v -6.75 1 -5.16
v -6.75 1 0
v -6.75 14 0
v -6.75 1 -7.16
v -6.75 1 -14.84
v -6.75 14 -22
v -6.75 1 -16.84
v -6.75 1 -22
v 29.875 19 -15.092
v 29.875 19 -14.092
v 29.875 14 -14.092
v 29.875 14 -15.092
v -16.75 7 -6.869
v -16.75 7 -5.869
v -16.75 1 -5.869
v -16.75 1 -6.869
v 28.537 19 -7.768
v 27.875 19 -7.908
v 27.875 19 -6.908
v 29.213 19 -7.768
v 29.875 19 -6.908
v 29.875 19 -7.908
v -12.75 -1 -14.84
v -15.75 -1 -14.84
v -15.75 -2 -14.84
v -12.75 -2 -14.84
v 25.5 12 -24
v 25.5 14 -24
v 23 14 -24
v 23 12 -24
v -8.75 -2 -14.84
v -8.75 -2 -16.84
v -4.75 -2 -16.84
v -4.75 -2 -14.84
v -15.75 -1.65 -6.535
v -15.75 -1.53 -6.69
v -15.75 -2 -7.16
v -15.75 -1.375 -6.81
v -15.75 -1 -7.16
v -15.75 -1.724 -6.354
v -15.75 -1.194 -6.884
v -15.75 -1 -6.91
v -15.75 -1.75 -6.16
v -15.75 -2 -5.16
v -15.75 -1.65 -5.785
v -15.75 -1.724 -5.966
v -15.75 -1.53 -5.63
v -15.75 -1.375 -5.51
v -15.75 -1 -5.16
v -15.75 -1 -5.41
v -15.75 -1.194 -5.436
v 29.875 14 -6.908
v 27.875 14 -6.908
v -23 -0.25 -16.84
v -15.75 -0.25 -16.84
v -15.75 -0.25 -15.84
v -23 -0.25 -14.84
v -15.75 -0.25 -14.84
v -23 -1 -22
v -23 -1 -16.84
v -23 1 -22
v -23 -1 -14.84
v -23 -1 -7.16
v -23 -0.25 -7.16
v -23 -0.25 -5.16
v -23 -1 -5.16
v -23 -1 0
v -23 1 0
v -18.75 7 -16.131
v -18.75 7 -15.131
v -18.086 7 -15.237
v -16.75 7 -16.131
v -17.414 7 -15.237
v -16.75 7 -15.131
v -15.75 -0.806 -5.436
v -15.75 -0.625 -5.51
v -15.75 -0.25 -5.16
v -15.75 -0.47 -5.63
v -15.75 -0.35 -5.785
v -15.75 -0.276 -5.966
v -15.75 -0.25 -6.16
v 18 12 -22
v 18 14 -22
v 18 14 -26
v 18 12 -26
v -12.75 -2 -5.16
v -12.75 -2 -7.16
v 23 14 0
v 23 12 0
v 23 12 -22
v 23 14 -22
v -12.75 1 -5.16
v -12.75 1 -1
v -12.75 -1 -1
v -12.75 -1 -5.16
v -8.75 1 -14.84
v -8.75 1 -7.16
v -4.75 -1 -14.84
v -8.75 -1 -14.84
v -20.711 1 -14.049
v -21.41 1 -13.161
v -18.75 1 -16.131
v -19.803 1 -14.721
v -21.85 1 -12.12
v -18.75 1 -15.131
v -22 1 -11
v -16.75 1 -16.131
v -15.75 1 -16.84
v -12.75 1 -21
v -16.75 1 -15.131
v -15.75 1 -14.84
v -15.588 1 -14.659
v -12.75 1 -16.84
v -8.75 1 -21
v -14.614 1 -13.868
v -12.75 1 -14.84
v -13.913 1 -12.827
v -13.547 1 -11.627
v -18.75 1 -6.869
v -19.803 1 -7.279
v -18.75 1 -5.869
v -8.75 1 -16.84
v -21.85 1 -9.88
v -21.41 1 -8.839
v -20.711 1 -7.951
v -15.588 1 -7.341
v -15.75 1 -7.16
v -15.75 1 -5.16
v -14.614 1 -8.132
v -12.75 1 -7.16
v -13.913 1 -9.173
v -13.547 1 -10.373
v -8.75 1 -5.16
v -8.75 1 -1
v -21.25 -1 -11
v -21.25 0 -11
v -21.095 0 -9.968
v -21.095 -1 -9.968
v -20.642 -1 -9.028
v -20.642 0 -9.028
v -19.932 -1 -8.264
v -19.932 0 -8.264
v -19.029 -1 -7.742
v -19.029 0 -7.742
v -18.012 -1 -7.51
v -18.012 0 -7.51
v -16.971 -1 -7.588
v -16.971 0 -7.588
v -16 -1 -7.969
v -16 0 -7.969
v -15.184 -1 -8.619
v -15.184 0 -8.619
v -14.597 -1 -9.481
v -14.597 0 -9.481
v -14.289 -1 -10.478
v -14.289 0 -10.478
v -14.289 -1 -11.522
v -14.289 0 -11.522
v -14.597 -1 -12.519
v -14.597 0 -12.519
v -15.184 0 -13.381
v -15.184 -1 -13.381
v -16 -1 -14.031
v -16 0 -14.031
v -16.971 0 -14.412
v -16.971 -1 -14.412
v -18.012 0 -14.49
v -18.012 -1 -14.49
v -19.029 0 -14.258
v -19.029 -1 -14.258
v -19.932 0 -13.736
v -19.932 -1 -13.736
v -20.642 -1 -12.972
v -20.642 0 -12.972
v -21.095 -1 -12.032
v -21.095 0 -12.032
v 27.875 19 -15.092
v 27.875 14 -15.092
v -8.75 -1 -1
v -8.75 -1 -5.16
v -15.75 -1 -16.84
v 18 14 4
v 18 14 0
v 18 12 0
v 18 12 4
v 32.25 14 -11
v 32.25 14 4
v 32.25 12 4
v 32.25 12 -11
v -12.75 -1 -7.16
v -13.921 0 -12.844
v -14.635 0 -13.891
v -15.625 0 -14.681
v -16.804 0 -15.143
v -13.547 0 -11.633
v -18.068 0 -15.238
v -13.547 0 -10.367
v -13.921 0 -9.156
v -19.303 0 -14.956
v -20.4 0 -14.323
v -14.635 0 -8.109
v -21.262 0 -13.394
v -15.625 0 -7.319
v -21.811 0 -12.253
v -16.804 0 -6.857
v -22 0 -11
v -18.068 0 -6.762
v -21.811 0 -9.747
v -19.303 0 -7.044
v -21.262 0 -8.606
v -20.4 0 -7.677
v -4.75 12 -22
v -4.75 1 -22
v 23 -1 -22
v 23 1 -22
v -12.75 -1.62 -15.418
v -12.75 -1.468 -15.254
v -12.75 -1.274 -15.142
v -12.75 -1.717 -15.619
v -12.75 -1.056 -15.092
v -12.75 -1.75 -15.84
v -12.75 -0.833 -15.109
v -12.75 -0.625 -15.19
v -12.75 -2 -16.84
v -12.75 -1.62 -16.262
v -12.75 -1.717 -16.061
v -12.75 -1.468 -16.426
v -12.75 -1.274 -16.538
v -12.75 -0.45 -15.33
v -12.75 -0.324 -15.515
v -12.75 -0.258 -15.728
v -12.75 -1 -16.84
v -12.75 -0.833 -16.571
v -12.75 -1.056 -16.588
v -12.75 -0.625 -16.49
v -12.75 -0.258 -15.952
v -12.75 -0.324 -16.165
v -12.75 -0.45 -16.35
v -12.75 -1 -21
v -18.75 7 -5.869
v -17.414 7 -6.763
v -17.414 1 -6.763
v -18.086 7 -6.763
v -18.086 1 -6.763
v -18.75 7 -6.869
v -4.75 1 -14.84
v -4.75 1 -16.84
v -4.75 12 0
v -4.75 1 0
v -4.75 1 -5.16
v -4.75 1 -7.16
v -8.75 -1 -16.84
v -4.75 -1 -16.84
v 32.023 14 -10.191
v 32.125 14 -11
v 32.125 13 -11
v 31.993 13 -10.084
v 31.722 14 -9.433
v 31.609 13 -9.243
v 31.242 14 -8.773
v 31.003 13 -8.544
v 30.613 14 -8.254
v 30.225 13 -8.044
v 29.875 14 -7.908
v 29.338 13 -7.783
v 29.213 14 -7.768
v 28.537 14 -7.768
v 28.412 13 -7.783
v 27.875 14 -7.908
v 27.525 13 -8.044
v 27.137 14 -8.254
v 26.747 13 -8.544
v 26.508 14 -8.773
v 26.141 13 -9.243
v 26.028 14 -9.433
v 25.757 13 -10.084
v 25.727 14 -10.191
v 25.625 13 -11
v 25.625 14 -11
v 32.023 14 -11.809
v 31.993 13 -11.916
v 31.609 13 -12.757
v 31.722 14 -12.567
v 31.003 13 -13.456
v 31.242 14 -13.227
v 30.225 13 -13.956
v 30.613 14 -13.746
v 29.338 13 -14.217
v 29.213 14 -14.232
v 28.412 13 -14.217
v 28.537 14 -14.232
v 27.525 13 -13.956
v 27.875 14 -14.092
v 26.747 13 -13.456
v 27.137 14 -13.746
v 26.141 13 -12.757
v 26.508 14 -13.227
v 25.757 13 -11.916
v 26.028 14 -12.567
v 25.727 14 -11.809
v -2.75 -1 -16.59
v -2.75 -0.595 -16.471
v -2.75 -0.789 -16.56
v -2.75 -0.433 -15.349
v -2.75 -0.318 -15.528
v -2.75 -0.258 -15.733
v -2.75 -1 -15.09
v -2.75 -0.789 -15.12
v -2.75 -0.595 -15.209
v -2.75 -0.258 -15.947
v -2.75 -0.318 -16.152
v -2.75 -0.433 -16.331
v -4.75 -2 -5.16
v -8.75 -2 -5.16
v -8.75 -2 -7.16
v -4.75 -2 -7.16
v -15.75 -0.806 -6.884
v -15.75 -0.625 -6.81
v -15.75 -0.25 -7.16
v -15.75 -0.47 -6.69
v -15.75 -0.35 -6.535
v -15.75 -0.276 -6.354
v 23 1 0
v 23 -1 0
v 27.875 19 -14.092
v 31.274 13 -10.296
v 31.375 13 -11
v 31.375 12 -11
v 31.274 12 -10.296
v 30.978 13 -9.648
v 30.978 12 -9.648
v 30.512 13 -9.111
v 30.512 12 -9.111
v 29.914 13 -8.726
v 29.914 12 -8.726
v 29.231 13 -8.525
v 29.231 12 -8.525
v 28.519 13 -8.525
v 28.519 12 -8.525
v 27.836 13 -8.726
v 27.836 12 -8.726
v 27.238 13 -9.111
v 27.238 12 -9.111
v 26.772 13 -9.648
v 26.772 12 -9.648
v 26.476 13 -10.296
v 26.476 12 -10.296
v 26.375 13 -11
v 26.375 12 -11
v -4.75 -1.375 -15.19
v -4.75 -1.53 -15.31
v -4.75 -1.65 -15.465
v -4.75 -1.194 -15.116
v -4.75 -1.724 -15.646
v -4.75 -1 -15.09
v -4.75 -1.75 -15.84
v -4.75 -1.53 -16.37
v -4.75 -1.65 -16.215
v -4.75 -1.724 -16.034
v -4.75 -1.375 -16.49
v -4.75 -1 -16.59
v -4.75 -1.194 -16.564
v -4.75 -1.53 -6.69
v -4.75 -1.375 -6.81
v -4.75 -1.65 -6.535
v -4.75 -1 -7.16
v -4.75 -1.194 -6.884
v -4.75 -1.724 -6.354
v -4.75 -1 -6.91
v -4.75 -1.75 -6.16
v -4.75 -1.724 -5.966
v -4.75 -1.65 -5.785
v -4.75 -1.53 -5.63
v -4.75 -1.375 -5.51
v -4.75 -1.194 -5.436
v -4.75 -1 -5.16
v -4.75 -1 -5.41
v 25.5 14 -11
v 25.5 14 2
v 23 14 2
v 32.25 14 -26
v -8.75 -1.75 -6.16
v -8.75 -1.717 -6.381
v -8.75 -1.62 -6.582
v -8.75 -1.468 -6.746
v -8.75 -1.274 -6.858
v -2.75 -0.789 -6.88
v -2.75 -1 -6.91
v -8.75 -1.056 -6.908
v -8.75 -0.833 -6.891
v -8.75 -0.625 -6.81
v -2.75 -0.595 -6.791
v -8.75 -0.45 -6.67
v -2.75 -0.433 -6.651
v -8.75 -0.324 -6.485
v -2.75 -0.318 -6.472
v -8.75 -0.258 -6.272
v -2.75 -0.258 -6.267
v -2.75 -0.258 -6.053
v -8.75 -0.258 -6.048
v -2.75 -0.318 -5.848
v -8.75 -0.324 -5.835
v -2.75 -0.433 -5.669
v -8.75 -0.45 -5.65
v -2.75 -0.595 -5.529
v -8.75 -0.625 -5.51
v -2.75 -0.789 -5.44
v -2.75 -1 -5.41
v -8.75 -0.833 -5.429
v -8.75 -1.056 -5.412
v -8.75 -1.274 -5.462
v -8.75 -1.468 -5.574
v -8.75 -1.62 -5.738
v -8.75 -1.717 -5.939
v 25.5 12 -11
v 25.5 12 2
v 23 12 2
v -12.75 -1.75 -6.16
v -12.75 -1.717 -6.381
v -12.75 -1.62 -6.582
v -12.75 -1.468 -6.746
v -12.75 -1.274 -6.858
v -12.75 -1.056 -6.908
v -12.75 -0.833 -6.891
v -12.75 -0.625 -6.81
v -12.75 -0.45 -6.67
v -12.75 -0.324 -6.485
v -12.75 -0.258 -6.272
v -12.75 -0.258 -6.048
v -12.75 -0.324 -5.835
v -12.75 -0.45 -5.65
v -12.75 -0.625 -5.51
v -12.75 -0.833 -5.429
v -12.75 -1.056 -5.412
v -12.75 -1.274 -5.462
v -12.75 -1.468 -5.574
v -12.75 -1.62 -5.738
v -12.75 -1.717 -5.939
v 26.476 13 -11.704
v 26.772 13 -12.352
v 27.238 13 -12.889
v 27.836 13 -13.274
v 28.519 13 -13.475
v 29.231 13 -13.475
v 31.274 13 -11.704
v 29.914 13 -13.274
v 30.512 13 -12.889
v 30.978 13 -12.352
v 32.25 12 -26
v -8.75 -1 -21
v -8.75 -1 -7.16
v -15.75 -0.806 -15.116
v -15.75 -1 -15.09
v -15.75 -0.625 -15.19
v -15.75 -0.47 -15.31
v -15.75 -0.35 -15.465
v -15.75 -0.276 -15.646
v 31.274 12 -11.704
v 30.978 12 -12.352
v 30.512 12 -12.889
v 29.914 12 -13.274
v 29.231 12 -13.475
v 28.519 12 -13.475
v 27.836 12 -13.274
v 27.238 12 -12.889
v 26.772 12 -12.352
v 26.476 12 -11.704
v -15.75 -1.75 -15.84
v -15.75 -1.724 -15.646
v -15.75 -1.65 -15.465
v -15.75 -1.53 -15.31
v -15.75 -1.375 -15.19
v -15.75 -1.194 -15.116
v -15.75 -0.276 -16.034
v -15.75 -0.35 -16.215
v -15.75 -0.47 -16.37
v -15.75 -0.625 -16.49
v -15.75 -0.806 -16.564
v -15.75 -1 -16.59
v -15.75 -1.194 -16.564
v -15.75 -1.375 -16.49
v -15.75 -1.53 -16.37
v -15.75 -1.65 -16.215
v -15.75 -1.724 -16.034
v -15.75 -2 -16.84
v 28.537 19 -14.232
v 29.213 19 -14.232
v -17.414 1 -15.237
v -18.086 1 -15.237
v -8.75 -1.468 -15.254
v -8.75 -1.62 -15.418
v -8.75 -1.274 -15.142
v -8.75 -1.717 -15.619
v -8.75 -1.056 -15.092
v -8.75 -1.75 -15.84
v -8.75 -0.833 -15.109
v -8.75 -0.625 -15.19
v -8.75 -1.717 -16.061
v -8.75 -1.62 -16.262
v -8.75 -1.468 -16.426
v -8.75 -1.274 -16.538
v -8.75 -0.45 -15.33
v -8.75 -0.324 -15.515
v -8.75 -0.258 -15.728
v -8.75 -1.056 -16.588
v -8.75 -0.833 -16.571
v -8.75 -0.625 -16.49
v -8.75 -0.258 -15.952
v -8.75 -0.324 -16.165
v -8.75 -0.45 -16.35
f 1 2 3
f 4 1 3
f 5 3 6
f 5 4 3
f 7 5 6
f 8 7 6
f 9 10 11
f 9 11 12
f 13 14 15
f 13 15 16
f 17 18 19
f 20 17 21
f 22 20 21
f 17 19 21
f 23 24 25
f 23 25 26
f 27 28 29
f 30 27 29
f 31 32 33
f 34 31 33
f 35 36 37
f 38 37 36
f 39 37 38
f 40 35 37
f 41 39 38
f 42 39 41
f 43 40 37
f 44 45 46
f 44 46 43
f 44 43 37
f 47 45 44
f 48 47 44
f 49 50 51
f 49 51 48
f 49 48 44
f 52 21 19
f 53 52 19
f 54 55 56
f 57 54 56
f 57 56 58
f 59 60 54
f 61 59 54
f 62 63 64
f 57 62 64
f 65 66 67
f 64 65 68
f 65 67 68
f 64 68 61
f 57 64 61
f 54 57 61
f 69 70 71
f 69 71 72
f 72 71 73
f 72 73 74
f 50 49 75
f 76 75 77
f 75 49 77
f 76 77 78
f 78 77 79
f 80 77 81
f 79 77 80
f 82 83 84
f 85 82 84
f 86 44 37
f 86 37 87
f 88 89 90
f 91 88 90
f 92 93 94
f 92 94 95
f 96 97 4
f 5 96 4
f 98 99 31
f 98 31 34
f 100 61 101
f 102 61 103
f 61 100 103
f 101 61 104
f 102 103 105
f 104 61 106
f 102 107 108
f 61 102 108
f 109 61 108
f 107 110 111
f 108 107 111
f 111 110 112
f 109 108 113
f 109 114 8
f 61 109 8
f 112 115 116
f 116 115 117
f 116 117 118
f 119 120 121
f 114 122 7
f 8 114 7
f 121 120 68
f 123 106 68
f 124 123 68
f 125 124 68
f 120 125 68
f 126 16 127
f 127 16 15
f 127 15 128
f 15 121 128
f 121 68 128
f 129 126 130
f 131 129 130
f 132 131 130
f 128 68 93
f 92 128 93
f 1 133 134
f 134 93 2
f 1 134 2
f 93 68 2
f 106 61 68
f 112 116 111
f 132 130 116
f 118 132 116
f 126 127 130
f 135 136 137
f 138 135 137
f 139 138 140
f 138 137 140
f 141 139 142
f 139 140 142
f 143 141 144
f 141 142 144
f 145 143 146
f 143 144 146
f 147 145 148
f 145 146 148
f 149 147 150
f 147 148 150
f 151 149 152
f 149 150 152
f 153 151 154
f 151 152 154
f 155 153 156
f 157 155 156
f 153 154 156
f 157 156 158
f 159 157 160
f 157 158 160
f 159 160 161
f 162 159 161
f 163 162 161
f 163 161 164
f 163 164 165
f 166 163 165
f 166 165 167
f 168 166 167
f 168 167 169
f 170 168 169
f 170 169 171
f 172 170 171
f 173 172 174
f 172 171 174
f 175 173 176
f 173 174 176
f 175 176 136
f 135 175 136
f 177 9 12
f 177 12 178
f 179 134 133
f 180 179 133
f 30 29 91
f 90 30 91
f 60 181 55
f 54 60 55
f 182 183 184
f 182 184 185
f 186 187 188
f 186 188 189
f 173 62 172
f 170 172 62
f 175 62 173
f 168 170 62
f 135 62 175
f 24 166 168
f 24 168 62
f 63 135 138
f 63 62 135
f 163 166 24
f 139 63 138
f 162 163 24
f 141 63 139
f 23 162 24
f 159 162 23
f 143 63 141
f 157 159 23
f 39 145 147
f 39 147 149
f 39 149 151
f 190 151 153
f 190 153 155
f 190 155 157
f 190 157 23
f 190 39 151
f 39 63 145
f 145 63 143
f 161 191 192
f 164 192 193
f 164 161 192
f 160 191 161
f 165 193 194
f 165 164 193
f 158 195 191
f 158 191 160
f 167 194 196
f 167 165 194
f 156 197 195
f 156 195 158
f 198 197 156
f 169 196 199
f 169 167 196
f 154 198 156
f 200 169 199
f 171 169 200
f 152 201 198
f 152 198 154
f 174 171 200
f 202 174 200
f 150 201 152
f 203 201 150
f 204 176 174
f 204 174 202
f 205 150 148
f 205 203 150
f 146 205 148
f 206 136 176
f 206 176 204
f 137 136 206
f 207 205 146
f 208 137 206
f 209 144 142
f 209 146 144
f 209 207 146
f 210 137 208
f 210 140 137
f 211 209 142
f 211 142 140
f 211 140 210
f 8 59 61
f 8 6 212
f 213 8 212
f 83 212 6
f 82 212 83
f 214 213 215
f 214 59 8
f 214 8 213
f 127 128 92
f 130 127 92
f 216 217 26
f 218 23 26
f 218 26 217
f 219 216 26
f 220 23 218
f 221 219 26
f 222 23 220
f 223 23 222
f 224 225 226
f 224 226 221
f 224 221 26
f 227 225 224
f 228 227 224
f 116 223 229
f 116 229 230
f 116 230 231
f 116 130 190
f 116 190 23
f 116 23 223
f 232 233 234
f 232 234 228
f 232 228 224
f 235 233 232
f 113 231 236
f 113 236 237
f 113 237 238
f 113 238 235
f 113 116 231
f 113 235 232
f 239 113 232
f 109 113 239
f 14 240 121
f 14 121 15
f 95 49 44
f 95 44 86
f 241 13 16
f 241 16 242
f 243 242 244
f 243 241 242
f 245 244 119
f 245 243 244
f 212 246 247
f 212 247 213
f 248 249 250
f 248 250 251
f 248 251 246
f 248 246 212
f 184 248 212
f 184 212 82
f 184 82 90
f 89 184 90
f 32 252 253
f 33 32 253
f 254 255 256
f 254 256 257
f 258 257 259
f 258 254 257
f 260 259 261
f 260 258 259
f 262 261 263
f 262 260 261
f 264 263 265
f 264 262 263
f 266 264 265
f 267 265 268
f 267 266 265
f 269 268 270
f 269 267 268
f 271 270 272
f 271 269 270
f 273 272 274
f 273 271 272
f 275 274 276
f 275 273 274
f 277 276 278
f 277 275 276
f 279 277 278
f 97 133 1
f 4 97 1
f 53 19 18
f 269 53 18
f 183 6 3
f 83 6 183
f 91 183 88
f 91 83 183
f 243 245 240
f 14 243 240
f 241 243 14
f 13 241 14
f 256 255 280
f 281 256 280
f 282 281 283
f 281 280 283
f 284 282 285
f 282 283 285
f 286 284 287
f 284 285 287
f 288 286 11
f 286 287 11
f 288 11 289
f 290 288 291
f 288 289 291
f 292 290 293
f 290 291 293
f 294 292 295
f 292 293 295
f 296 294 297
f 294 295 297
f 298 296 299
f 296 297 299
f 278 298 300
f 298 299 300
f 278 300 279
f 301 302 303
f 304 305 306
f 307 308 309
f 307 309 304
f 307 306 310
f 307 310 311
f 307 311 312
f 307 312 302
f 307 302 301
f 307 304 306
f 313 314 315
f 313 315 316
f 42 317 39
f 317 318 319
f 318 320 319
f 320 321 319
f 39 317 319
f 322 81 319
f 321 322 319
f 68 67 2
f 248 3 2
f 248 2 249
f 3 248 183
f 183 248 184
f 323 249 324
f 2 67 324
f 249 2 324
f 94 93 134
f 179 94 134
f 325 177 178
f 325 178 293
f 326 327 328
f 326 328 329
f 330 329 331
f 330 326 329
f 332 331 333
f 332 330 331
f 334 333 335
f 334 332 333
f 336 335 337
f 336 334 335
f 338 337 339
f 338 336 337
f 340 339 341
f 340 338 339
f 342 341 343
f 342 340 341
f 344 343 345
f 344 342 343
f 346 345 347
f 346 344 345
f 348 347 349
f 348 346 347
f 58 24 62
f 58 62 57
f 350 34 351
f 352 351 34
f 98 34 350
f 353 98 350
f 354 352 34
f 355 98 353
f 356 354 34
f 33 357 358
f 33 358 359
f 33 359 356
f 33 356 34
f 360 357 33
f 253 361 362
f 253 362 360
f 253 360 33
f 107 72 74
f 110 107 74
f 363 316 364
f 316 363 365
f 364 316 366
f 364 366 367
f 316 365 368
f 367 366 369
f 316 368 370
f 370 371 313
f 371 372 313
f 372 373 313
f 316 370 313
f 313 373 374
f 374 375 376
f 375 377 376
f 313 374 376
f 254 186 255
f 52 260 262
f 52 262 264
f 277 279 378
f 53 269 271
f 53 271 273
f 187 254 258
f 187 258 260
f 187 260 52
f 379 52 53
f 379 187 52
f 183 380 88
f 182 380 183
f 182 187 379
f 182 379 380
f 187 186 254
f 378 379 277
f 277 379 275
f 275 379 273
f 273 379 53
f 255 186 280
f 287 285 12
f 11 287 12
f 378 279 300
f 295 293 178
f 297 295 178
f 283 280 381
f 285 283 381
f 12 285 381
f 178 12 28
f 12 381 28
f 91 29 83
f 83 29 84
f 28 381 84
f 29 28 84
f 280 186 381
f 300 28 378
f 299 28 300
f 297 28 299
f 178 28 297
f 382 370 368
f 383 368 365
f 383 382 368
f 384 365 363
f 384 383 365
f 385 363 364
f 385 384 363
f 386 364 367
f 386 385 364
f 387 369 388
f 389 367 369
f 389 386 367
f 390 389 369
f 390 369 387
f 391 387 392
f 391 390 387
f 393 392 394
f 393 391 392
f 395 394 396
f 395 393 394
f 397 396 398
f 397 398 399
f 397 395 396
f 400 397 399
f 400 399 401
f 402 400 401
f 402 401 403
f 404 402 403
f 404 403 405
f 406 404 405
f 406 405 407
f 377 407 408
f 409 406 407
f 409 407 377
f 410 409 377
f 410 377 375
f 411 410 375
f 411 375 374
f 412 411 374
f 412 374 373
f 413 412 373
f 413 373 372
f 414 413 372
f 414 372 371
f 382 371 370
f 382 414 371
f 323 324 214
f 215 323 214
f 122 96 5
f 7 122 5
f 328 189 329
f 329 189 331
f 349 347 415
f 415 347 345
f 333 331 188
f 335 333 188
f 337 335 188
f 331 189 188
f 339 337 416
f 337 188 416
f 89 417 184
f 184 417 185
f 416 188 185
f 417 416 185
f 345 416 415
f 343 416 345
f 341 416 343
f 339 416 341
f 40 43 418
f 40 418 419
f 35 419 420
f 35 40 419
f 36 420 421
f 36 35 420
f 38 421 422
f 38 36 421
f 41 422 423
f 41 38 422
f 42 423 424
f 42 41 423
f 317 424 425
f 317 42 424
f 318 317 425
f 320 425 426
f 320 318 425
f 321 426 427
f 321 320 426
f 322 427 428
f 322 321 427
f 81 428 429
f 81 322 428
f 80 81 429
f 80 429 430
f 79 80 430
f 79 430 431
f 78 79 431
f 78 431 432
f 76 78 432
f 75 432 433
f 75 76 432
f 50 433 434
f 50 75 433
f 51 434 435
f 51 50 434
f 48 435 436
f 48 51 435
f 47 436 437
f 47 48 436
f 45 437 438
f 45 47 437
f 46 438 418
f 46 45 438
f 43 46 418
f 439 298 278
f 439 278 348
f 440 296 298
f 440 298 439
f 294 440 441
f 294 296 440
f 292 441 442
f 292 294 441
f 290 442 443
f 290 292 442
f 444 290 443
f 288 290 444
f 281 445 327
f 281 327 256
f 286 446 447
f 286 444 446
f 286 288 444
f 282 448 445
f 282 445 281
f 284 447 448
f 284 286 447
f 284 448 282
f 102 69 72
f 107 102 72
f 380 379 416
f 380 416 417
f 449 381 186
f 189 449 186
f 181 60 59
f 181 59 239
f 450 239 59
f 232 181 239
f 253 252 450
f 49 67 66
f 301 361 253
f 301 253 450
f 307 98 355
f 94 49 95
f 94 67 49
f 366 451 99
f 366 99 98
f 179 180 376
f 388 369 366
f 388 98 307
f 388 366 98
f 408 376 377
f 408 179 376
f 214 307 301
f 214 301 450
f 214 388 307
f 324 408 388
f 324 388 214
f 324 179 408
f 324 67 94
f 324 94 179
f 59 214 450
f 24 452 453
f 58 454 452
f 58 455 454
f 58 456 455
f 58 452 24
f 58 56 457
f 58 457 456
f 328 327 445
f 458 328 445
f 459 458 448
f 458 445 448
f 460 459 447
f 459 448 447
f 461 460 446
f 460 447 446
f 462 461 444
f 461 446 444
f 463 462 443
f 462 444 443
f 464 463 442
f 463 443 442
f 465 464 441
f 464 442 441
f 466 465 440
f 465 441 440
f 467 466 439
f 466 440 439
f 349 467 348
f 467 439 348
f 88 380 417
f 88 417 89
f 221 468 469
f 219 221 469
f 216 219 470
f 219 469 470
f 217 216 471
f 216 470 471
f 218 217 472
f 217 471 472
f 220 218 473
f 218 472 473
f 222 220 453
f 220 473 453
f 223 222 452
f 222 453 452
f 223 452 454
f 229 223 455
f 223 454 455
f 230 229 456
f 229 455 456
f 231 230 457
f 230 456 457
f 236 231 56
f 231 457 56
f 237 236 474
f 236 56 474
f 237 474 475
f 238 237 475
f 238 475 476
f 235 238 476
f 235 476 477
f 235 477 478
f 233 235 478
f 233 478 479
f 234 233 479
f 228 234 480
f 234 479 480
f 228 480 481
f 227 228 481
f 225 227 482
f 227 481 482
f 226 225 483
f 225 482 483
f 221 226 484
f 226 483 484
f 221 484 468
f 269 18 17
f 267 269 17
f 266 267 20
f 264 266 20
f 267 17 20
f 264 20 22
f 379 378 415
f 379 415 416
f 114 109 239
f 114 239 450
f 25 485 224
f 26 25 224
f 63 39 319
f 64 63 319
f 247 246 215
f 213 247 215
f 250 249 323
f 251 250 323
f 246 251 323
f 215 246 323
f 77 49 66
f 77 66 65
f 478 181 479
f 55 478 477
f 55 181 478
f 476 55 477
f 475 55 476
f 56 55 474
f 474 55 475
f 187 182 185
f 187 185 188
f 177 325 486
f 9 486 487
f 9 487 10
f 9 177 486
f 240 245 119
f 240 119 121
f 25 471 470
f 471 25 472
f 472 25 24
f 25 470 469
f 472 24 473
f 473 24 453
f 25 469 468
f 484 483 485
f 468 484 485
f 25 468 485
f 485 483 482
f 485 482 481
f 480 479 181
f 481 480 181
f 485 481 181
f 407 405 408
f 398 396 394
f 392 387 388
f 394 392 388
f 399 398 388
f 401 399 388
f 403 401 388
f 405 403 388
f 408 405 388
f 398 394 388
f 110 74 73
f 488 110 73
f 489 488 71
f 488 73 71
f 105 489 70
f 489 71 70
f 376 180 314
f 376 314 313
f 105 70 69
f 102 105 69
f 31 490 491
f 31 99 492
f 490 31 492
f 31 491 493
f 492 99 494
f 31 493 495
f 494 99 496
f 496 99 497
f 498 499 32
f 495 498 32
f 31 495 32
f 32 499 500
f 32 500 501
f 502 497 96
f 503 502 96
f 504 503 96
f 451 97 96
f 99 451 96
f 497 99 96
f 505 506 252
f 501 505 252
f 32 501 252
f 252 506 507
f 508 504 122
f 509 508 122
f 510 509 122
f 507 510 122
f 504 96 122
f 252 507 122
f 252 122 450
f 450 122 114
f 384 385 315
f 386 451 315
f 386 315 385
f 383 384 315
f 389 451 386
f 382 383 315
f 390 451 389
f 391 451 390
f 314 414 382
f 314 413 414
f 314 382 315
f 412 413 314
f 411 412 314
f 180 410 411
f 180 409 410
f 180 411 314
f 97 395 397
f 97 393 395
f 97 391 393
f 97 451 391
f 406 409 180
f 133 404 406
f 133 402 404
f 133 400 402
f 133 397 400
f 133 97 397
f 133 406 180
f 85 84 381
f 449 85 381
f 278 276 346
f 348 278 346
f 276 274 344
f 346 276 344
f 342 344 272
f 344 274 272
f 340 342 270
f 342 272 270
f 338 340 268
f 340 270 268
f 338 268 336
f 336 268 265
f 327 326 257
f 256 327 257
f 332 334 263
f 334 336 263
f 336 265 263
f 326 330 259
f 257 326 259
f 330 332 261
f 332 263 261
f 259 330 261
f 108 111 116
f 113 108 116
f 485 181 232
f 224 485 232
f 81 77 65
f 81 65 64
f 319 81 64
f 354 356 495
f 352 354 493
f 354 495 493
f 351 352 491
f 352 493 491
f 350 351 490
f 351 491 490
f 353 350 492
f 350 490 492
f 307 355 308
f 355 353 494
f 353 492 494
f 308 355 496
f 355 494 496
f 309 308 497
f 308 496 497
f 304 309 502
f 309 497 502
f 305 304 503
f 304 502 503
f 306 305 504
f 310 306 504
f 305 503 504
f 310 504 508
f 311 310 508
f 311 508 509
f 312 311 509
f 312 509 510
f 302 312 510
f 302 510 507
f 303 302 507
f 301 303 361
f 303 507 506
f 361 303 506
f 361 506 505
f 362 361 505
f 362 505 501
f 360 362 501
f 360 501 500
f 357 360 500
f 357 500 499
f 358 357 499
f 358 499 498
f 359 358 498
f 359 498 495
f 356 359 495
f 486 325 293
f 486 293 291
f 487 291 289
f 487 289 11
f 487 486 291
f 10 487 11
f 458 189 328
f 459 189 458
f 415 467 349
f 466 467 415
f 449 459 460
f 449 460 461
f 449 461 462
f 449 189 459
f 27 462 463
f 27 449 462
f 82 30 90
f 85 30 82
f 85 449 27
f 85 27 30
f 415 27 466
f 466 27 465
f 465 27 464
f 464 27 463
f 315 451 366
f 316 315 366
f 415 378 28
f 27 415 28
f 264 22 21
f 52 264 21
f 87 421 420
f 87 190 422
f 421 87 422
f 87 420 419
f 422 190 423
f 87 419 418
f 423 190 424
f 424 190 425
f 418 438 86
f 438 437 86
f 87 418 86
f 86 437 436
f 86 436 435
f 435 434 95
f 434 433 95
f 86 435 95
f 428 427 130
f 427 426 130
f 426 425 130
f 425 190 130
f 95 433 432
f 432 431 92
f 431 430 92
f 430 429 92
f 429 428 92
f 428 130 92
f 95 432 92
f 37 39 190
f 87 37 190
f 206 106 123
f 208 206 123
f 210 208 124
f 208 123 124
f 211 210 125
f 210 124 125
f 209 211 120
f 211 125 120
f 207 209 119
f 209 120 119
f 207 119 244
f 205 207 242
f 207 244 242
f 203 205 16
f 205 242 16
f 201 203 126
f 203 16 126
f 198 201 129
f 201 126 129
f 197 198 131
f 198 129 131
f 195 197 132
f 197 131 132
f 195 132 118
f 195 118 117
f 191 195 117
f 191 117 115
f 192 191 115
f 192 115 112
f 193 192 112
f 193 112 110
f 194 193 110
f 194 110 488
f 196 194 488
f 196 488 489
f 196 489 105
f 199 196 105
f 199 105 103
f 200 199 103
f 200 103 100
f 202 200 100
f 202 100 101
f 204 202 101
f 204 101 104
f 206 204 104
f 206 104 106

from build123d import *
from build123d.topology import SkipClean

# Parameters (mm, degrees)
SKETCH1_W           = 46
SKETCH1_H           = 2
BOSS_EXTRUDE1_DEPTH = 22
SKETCH2_W           = 29.75
SKETCH2_H           = 22
BOSS_EXTRUDE2_DEPTH = 13
SKETCH3_W           = 27.75
SKETCH3_H           = 11
CUT_EXTRUDE1_DEPTH  = 22
SKETCH4_R           = 4.25
CUT_EXTRUDE2_DEPTH  = 1
SKETCH5_R           = 3.5
CUT_EXTRUDE3_DEPTH  = 1
BOSS_EXTRUDE4_START = 6
BOSS_EXTRUDE4_DEPTH = 6
SKETCH20_W          = 11
SKETCH20_H          = 2
BOSS_EXTRUDE8_DEPTH = 3
SKETCH6_W           = 4
SKETCH6_H           = 20
CUT_EXTRUDE4_DEPTH  = 35.380226875
SKETCH25_W          = 2
SKETCH25_H          = 1.75
CUT_EXTRUDE7_DEPTH  = 47.707199659
SKETCH26_R          = 0.75
CUT_EXTRUDE8_DEPTH  = 13
BOSS_EXTRUDE3_DEPTH = 2
SKETCH13_R          = 3.25
CUT_EXTRUDE5_DEPTH  = 1
SKETCH14_R          = 2.5
CUT_EXTRUDE6_DEPTH  = 1
BOSS_EXTRUDE6_START = 5
BOSS_EXTRUDE6_DEPTH = 5


with BuildPart() as part:
    # Sketch1 → Boss-Extrude1 (new body)
    with BuildSketch(Plane.XY):
        Rectangle(SKETCH1_W, SKETCH1_H)
    extrude(amount=-BOSS_EXTRUDE1_DEPTH)

    # Sketch2 → Boss-Extrude2 (add)
    with BuildSketch(Plane(origin=(0, 1, 0), x_dir=(1, 0, 0), z_dir=(0, 1, 0))):
        with Locations((8.125, 11)):
            Rectangle(SKETCH2_W, SKETCH2_H)
    extrude(amount=BOSS_EXTRUDE2_DEPTH)

    # Sketch3 → Cut-Extrude1 (cut)
    with BuildSketch(Plane.XY):
        with Locations((9.125, 6.5)):
            Rectangle(SKETCH3_W, SKETCH3_H)
    extrude(amount=-CUT_EXTRUDE1_DEPTH, mode=Mode.SUBTRACT)

    # Sketch4 → Cut-Extrude2 (cut)
    with BuildSketch(Plane(origin=(0, 1, 0), x_dir=(1, 0, 0), z_dir=(0, 1, 0))):
        with Locations(Location((-17.75, 11, 0), (0, 0, 180))):
            Circle(SKETCH4_R)
    extrude(amount=-CUT_EXTRUDE2_DEPTH, mode=Mode.SUBTRACT)

    # Sketch5 → Cut-Extrude3 (cut)
    with BuildSketch(Plane(origin=(0, 0, 0), x_dir=(1, 0, 0), z_dir=(0, 1, 0))):
        with Locations(Location((-17.75, 11, 0), (0, 0, 180))):
            Circle(SKETCH5_R)
    extrude(amount=-CUT_EXTRUDE3_DEPTH, mode=Mode.SUBTRACT)

    # Sketch16 → Boss-Extrude4 (add)
    with SkipClean():  # the faces are left unmerged after this step: merging them gives an invalid solid
        with BuildSketch(Plane(origin=(0, 1, 0), x_dir=(1, 0, 0), z_dir=(0, 1, 0)).offset(BOSS_EXTRUDE4_START)):
            with BuildLine():
                Line((-18.75, 6.86932209), (-18.75, 5.86932209))
                Line((-18.75, 5.86932209), (-16.75, 5.86932209))
                Line((-16.75, 5.86932209), (-16.75, 6.86932209))
                ThreePointArc((-16.75, 6.86932209), (-17.75, 6.75), (-18.75, 6.86932209))
            make_face()
        boss_extrude4 = extrude(amount=-BOSS_EXTRUDE4_DEPTH)

    # Sketch20 → Boss-Extrude8 (add)
    with SkipClean():  # the faces are left unmerged after this step: merging them gives an invalid solid
        with BuildSketch(Plane(origin=(0, 1, 0), x_dir=(1, 0, 0), z_dir=(0, 1, 0))):
            with Locations((-10.25, 15.84)):
                Rectangle(SKETCH20_W, SKETCH20_H)
        boss_extrude8 = extrude(amount=-BOSS_EXTRUDE8_DEPTH)

    # Sketch6 → Cut-Extrude4 (cut, through all)
    with SkipClean():  # the faces are left unmerged after this step: merging them gives an invalid solid
        with BuildSketch(Plane(origin=(0, 1, 0), x_dir=(1, 0, 0), z_dir=(0, 1, 0))):
            with Locations((-10.75, 11)):
                Rectangle(SKETCH6_W, SKETCH6_H)
        cut_extrude4 = extrude(amount=-CUT_EXTRUDE4_DEPTH, mode=Mode.SUBTRACT)

    # Sketch25 → Cut-Extrude7 (cut, through all)
    with SkipClean():  # the faces are left unmerged after this step: merging them gives an invalid solid
        with BuildSketch(Plane.ZY.offset(15.75)):
            with Locations((-15.84, -1.125)):
                Rectangle(SKETCH25_W, SKETCH25_H)
        cut_extrude7 = extrude(amount=CUT_EXTRUDE7_DEPTH, mode=Mode.SUBTRACT)

    # Sketch26 → Cut-Extrude8 (cut)
    with SkipClean():  # the faces are left unmerged after this step: merging them gives an invalid solid
        with BuildSketch(Plane.ZY.offset(15.75)):
            with Locations(Location((-15.84, -1, 0), (0, 0, 270))):
                Circle(SKETCH26_R)
        cut_extrude8 = extrude(amount=-CUT_EXTRUDE8_DEPTH, mode=Mode.SUBTRACT)

    # Mirror8: Boss-Extrude4, Boss-Extrude8, Cut-Extrude4, Cut-Extrude7, Cut-Extrude8 across plane
    with SkipClean():  # the faces are left unmerged after this step: merging them gives an invalid solid
        add(boss_extrude4.mirror(Plane.XY.offset(-11)))
        add(boss_extrude8.mirror(Plane.XY.offset(-11)))
        add(cut_extrude4.mirror(Plane.XY.offset(-11)), mode=Mode.SUBTRACT)
        add(cut_extrude7.mirror(Plane.XY.offset(-11)), mode=Mode.SUBTRACT)
        add(cut_extrude8.mirror(Plane.XY.offset(-11)), mode=Mode.SUBTRACT)

    # Sketch12 → Boss-Extrude3 (add)
    with SkipClean():  # the faces are left unmerged after this step: merging them gives an invalid solid
        with BuildSketch(Plane(origin=(0, 14, 0), x_dir=(1, 0, 0), z_dir=(0, 1, 0))):
            Polygon((23, 22), (18, 22), (18, 26), (32.25, 26), (32.25, 11), (25.5, 11), (25.5, 24), (23, 24), align=None)
        boss_extrude3 = extrude(amount=-BOSS_EXTRUDE3_DEPTH)

    # Sketch13 → Cut-Extrude5 (cut)
    with SkipClean():  # the faces are left unmerged after this step: merging them gives an invalid solid
        with BuildSketch(Plane(origin=(0, 14, 0), x_dir=(1, 0, 0), z_dir=(0, 1, 0))):
            with Locations((28.875, 11)):
                Circle(SKETCH13_R)
        cut_extrude5 = extrude(amount=-CUT_EXTRUDE5_DEPTH, mode=Mode.SUBTRACT)

    # Sketch14 → Cut-Extrude6 (cut)
    with SkipClean():  # the faces are left unmerged after this step: merging them gives an invalid solid
        with BuildSketch(Plane(origin=(0, 13, 0), x_dir=(1, 0, 0), z_dir=(0, 1, 0))):
            with Locations((28.875, 11)):
                Circle(SKETCH14_R)
        cut_extrude6 = extrude(amount=-CUT_EXTRUDE6_DEPTH, mode=Mode.SUBTRACT)

    # Sketch18 → Boss-Extrude6 (add)
    with SkipClean():  # the faces are left unmerged after this step: merging them gives an invalid solid
        with BuildSketch(Plane(origin=(0, 14, 0), x_dir=(1, 0, 0), z_dir=(0, 1, 0)).offset(BOSS_EXTRUDE6_START)):
            with BuildLine():
                Line((29.875, 14.092329219), (29.875, 15.092329219))
                Line((29.875, 15.092329219), (27.875, 15.092329219))
                Line((27.875, 15.092329219), (27.875, 14.092329219))
                ThreePointArc((27.875, 14.092329219), (28.875, 14.25), (29.875, 14.092329219))
            make_face()
        boss_extrude6 = extrude(amount=-BOSS_EXTRUDE6_DEPTH)

    # Mirror3: Boss-Extrude3, Cut-Extrude5, Cut-Extrude6, Boss-Extrude6 across plane
    with SkipClean():  # the faces are left unmerged after this step: merging them gives an invalid solid
        add(boss_extrude3.mirror(Plane.XY.offset(-11)))
        add(cut_extrude5.mirror(Plane.XY.offset(-11)), mode=Mode.SUBTRACT)
        add(cut_extrude6.mirror(Plane.XY.offset(-11)), mode=Mode.SUBTRACT)
        add(boss_extrude6.mirror(Plane.XY.offset(-11)))


solid = part.part
